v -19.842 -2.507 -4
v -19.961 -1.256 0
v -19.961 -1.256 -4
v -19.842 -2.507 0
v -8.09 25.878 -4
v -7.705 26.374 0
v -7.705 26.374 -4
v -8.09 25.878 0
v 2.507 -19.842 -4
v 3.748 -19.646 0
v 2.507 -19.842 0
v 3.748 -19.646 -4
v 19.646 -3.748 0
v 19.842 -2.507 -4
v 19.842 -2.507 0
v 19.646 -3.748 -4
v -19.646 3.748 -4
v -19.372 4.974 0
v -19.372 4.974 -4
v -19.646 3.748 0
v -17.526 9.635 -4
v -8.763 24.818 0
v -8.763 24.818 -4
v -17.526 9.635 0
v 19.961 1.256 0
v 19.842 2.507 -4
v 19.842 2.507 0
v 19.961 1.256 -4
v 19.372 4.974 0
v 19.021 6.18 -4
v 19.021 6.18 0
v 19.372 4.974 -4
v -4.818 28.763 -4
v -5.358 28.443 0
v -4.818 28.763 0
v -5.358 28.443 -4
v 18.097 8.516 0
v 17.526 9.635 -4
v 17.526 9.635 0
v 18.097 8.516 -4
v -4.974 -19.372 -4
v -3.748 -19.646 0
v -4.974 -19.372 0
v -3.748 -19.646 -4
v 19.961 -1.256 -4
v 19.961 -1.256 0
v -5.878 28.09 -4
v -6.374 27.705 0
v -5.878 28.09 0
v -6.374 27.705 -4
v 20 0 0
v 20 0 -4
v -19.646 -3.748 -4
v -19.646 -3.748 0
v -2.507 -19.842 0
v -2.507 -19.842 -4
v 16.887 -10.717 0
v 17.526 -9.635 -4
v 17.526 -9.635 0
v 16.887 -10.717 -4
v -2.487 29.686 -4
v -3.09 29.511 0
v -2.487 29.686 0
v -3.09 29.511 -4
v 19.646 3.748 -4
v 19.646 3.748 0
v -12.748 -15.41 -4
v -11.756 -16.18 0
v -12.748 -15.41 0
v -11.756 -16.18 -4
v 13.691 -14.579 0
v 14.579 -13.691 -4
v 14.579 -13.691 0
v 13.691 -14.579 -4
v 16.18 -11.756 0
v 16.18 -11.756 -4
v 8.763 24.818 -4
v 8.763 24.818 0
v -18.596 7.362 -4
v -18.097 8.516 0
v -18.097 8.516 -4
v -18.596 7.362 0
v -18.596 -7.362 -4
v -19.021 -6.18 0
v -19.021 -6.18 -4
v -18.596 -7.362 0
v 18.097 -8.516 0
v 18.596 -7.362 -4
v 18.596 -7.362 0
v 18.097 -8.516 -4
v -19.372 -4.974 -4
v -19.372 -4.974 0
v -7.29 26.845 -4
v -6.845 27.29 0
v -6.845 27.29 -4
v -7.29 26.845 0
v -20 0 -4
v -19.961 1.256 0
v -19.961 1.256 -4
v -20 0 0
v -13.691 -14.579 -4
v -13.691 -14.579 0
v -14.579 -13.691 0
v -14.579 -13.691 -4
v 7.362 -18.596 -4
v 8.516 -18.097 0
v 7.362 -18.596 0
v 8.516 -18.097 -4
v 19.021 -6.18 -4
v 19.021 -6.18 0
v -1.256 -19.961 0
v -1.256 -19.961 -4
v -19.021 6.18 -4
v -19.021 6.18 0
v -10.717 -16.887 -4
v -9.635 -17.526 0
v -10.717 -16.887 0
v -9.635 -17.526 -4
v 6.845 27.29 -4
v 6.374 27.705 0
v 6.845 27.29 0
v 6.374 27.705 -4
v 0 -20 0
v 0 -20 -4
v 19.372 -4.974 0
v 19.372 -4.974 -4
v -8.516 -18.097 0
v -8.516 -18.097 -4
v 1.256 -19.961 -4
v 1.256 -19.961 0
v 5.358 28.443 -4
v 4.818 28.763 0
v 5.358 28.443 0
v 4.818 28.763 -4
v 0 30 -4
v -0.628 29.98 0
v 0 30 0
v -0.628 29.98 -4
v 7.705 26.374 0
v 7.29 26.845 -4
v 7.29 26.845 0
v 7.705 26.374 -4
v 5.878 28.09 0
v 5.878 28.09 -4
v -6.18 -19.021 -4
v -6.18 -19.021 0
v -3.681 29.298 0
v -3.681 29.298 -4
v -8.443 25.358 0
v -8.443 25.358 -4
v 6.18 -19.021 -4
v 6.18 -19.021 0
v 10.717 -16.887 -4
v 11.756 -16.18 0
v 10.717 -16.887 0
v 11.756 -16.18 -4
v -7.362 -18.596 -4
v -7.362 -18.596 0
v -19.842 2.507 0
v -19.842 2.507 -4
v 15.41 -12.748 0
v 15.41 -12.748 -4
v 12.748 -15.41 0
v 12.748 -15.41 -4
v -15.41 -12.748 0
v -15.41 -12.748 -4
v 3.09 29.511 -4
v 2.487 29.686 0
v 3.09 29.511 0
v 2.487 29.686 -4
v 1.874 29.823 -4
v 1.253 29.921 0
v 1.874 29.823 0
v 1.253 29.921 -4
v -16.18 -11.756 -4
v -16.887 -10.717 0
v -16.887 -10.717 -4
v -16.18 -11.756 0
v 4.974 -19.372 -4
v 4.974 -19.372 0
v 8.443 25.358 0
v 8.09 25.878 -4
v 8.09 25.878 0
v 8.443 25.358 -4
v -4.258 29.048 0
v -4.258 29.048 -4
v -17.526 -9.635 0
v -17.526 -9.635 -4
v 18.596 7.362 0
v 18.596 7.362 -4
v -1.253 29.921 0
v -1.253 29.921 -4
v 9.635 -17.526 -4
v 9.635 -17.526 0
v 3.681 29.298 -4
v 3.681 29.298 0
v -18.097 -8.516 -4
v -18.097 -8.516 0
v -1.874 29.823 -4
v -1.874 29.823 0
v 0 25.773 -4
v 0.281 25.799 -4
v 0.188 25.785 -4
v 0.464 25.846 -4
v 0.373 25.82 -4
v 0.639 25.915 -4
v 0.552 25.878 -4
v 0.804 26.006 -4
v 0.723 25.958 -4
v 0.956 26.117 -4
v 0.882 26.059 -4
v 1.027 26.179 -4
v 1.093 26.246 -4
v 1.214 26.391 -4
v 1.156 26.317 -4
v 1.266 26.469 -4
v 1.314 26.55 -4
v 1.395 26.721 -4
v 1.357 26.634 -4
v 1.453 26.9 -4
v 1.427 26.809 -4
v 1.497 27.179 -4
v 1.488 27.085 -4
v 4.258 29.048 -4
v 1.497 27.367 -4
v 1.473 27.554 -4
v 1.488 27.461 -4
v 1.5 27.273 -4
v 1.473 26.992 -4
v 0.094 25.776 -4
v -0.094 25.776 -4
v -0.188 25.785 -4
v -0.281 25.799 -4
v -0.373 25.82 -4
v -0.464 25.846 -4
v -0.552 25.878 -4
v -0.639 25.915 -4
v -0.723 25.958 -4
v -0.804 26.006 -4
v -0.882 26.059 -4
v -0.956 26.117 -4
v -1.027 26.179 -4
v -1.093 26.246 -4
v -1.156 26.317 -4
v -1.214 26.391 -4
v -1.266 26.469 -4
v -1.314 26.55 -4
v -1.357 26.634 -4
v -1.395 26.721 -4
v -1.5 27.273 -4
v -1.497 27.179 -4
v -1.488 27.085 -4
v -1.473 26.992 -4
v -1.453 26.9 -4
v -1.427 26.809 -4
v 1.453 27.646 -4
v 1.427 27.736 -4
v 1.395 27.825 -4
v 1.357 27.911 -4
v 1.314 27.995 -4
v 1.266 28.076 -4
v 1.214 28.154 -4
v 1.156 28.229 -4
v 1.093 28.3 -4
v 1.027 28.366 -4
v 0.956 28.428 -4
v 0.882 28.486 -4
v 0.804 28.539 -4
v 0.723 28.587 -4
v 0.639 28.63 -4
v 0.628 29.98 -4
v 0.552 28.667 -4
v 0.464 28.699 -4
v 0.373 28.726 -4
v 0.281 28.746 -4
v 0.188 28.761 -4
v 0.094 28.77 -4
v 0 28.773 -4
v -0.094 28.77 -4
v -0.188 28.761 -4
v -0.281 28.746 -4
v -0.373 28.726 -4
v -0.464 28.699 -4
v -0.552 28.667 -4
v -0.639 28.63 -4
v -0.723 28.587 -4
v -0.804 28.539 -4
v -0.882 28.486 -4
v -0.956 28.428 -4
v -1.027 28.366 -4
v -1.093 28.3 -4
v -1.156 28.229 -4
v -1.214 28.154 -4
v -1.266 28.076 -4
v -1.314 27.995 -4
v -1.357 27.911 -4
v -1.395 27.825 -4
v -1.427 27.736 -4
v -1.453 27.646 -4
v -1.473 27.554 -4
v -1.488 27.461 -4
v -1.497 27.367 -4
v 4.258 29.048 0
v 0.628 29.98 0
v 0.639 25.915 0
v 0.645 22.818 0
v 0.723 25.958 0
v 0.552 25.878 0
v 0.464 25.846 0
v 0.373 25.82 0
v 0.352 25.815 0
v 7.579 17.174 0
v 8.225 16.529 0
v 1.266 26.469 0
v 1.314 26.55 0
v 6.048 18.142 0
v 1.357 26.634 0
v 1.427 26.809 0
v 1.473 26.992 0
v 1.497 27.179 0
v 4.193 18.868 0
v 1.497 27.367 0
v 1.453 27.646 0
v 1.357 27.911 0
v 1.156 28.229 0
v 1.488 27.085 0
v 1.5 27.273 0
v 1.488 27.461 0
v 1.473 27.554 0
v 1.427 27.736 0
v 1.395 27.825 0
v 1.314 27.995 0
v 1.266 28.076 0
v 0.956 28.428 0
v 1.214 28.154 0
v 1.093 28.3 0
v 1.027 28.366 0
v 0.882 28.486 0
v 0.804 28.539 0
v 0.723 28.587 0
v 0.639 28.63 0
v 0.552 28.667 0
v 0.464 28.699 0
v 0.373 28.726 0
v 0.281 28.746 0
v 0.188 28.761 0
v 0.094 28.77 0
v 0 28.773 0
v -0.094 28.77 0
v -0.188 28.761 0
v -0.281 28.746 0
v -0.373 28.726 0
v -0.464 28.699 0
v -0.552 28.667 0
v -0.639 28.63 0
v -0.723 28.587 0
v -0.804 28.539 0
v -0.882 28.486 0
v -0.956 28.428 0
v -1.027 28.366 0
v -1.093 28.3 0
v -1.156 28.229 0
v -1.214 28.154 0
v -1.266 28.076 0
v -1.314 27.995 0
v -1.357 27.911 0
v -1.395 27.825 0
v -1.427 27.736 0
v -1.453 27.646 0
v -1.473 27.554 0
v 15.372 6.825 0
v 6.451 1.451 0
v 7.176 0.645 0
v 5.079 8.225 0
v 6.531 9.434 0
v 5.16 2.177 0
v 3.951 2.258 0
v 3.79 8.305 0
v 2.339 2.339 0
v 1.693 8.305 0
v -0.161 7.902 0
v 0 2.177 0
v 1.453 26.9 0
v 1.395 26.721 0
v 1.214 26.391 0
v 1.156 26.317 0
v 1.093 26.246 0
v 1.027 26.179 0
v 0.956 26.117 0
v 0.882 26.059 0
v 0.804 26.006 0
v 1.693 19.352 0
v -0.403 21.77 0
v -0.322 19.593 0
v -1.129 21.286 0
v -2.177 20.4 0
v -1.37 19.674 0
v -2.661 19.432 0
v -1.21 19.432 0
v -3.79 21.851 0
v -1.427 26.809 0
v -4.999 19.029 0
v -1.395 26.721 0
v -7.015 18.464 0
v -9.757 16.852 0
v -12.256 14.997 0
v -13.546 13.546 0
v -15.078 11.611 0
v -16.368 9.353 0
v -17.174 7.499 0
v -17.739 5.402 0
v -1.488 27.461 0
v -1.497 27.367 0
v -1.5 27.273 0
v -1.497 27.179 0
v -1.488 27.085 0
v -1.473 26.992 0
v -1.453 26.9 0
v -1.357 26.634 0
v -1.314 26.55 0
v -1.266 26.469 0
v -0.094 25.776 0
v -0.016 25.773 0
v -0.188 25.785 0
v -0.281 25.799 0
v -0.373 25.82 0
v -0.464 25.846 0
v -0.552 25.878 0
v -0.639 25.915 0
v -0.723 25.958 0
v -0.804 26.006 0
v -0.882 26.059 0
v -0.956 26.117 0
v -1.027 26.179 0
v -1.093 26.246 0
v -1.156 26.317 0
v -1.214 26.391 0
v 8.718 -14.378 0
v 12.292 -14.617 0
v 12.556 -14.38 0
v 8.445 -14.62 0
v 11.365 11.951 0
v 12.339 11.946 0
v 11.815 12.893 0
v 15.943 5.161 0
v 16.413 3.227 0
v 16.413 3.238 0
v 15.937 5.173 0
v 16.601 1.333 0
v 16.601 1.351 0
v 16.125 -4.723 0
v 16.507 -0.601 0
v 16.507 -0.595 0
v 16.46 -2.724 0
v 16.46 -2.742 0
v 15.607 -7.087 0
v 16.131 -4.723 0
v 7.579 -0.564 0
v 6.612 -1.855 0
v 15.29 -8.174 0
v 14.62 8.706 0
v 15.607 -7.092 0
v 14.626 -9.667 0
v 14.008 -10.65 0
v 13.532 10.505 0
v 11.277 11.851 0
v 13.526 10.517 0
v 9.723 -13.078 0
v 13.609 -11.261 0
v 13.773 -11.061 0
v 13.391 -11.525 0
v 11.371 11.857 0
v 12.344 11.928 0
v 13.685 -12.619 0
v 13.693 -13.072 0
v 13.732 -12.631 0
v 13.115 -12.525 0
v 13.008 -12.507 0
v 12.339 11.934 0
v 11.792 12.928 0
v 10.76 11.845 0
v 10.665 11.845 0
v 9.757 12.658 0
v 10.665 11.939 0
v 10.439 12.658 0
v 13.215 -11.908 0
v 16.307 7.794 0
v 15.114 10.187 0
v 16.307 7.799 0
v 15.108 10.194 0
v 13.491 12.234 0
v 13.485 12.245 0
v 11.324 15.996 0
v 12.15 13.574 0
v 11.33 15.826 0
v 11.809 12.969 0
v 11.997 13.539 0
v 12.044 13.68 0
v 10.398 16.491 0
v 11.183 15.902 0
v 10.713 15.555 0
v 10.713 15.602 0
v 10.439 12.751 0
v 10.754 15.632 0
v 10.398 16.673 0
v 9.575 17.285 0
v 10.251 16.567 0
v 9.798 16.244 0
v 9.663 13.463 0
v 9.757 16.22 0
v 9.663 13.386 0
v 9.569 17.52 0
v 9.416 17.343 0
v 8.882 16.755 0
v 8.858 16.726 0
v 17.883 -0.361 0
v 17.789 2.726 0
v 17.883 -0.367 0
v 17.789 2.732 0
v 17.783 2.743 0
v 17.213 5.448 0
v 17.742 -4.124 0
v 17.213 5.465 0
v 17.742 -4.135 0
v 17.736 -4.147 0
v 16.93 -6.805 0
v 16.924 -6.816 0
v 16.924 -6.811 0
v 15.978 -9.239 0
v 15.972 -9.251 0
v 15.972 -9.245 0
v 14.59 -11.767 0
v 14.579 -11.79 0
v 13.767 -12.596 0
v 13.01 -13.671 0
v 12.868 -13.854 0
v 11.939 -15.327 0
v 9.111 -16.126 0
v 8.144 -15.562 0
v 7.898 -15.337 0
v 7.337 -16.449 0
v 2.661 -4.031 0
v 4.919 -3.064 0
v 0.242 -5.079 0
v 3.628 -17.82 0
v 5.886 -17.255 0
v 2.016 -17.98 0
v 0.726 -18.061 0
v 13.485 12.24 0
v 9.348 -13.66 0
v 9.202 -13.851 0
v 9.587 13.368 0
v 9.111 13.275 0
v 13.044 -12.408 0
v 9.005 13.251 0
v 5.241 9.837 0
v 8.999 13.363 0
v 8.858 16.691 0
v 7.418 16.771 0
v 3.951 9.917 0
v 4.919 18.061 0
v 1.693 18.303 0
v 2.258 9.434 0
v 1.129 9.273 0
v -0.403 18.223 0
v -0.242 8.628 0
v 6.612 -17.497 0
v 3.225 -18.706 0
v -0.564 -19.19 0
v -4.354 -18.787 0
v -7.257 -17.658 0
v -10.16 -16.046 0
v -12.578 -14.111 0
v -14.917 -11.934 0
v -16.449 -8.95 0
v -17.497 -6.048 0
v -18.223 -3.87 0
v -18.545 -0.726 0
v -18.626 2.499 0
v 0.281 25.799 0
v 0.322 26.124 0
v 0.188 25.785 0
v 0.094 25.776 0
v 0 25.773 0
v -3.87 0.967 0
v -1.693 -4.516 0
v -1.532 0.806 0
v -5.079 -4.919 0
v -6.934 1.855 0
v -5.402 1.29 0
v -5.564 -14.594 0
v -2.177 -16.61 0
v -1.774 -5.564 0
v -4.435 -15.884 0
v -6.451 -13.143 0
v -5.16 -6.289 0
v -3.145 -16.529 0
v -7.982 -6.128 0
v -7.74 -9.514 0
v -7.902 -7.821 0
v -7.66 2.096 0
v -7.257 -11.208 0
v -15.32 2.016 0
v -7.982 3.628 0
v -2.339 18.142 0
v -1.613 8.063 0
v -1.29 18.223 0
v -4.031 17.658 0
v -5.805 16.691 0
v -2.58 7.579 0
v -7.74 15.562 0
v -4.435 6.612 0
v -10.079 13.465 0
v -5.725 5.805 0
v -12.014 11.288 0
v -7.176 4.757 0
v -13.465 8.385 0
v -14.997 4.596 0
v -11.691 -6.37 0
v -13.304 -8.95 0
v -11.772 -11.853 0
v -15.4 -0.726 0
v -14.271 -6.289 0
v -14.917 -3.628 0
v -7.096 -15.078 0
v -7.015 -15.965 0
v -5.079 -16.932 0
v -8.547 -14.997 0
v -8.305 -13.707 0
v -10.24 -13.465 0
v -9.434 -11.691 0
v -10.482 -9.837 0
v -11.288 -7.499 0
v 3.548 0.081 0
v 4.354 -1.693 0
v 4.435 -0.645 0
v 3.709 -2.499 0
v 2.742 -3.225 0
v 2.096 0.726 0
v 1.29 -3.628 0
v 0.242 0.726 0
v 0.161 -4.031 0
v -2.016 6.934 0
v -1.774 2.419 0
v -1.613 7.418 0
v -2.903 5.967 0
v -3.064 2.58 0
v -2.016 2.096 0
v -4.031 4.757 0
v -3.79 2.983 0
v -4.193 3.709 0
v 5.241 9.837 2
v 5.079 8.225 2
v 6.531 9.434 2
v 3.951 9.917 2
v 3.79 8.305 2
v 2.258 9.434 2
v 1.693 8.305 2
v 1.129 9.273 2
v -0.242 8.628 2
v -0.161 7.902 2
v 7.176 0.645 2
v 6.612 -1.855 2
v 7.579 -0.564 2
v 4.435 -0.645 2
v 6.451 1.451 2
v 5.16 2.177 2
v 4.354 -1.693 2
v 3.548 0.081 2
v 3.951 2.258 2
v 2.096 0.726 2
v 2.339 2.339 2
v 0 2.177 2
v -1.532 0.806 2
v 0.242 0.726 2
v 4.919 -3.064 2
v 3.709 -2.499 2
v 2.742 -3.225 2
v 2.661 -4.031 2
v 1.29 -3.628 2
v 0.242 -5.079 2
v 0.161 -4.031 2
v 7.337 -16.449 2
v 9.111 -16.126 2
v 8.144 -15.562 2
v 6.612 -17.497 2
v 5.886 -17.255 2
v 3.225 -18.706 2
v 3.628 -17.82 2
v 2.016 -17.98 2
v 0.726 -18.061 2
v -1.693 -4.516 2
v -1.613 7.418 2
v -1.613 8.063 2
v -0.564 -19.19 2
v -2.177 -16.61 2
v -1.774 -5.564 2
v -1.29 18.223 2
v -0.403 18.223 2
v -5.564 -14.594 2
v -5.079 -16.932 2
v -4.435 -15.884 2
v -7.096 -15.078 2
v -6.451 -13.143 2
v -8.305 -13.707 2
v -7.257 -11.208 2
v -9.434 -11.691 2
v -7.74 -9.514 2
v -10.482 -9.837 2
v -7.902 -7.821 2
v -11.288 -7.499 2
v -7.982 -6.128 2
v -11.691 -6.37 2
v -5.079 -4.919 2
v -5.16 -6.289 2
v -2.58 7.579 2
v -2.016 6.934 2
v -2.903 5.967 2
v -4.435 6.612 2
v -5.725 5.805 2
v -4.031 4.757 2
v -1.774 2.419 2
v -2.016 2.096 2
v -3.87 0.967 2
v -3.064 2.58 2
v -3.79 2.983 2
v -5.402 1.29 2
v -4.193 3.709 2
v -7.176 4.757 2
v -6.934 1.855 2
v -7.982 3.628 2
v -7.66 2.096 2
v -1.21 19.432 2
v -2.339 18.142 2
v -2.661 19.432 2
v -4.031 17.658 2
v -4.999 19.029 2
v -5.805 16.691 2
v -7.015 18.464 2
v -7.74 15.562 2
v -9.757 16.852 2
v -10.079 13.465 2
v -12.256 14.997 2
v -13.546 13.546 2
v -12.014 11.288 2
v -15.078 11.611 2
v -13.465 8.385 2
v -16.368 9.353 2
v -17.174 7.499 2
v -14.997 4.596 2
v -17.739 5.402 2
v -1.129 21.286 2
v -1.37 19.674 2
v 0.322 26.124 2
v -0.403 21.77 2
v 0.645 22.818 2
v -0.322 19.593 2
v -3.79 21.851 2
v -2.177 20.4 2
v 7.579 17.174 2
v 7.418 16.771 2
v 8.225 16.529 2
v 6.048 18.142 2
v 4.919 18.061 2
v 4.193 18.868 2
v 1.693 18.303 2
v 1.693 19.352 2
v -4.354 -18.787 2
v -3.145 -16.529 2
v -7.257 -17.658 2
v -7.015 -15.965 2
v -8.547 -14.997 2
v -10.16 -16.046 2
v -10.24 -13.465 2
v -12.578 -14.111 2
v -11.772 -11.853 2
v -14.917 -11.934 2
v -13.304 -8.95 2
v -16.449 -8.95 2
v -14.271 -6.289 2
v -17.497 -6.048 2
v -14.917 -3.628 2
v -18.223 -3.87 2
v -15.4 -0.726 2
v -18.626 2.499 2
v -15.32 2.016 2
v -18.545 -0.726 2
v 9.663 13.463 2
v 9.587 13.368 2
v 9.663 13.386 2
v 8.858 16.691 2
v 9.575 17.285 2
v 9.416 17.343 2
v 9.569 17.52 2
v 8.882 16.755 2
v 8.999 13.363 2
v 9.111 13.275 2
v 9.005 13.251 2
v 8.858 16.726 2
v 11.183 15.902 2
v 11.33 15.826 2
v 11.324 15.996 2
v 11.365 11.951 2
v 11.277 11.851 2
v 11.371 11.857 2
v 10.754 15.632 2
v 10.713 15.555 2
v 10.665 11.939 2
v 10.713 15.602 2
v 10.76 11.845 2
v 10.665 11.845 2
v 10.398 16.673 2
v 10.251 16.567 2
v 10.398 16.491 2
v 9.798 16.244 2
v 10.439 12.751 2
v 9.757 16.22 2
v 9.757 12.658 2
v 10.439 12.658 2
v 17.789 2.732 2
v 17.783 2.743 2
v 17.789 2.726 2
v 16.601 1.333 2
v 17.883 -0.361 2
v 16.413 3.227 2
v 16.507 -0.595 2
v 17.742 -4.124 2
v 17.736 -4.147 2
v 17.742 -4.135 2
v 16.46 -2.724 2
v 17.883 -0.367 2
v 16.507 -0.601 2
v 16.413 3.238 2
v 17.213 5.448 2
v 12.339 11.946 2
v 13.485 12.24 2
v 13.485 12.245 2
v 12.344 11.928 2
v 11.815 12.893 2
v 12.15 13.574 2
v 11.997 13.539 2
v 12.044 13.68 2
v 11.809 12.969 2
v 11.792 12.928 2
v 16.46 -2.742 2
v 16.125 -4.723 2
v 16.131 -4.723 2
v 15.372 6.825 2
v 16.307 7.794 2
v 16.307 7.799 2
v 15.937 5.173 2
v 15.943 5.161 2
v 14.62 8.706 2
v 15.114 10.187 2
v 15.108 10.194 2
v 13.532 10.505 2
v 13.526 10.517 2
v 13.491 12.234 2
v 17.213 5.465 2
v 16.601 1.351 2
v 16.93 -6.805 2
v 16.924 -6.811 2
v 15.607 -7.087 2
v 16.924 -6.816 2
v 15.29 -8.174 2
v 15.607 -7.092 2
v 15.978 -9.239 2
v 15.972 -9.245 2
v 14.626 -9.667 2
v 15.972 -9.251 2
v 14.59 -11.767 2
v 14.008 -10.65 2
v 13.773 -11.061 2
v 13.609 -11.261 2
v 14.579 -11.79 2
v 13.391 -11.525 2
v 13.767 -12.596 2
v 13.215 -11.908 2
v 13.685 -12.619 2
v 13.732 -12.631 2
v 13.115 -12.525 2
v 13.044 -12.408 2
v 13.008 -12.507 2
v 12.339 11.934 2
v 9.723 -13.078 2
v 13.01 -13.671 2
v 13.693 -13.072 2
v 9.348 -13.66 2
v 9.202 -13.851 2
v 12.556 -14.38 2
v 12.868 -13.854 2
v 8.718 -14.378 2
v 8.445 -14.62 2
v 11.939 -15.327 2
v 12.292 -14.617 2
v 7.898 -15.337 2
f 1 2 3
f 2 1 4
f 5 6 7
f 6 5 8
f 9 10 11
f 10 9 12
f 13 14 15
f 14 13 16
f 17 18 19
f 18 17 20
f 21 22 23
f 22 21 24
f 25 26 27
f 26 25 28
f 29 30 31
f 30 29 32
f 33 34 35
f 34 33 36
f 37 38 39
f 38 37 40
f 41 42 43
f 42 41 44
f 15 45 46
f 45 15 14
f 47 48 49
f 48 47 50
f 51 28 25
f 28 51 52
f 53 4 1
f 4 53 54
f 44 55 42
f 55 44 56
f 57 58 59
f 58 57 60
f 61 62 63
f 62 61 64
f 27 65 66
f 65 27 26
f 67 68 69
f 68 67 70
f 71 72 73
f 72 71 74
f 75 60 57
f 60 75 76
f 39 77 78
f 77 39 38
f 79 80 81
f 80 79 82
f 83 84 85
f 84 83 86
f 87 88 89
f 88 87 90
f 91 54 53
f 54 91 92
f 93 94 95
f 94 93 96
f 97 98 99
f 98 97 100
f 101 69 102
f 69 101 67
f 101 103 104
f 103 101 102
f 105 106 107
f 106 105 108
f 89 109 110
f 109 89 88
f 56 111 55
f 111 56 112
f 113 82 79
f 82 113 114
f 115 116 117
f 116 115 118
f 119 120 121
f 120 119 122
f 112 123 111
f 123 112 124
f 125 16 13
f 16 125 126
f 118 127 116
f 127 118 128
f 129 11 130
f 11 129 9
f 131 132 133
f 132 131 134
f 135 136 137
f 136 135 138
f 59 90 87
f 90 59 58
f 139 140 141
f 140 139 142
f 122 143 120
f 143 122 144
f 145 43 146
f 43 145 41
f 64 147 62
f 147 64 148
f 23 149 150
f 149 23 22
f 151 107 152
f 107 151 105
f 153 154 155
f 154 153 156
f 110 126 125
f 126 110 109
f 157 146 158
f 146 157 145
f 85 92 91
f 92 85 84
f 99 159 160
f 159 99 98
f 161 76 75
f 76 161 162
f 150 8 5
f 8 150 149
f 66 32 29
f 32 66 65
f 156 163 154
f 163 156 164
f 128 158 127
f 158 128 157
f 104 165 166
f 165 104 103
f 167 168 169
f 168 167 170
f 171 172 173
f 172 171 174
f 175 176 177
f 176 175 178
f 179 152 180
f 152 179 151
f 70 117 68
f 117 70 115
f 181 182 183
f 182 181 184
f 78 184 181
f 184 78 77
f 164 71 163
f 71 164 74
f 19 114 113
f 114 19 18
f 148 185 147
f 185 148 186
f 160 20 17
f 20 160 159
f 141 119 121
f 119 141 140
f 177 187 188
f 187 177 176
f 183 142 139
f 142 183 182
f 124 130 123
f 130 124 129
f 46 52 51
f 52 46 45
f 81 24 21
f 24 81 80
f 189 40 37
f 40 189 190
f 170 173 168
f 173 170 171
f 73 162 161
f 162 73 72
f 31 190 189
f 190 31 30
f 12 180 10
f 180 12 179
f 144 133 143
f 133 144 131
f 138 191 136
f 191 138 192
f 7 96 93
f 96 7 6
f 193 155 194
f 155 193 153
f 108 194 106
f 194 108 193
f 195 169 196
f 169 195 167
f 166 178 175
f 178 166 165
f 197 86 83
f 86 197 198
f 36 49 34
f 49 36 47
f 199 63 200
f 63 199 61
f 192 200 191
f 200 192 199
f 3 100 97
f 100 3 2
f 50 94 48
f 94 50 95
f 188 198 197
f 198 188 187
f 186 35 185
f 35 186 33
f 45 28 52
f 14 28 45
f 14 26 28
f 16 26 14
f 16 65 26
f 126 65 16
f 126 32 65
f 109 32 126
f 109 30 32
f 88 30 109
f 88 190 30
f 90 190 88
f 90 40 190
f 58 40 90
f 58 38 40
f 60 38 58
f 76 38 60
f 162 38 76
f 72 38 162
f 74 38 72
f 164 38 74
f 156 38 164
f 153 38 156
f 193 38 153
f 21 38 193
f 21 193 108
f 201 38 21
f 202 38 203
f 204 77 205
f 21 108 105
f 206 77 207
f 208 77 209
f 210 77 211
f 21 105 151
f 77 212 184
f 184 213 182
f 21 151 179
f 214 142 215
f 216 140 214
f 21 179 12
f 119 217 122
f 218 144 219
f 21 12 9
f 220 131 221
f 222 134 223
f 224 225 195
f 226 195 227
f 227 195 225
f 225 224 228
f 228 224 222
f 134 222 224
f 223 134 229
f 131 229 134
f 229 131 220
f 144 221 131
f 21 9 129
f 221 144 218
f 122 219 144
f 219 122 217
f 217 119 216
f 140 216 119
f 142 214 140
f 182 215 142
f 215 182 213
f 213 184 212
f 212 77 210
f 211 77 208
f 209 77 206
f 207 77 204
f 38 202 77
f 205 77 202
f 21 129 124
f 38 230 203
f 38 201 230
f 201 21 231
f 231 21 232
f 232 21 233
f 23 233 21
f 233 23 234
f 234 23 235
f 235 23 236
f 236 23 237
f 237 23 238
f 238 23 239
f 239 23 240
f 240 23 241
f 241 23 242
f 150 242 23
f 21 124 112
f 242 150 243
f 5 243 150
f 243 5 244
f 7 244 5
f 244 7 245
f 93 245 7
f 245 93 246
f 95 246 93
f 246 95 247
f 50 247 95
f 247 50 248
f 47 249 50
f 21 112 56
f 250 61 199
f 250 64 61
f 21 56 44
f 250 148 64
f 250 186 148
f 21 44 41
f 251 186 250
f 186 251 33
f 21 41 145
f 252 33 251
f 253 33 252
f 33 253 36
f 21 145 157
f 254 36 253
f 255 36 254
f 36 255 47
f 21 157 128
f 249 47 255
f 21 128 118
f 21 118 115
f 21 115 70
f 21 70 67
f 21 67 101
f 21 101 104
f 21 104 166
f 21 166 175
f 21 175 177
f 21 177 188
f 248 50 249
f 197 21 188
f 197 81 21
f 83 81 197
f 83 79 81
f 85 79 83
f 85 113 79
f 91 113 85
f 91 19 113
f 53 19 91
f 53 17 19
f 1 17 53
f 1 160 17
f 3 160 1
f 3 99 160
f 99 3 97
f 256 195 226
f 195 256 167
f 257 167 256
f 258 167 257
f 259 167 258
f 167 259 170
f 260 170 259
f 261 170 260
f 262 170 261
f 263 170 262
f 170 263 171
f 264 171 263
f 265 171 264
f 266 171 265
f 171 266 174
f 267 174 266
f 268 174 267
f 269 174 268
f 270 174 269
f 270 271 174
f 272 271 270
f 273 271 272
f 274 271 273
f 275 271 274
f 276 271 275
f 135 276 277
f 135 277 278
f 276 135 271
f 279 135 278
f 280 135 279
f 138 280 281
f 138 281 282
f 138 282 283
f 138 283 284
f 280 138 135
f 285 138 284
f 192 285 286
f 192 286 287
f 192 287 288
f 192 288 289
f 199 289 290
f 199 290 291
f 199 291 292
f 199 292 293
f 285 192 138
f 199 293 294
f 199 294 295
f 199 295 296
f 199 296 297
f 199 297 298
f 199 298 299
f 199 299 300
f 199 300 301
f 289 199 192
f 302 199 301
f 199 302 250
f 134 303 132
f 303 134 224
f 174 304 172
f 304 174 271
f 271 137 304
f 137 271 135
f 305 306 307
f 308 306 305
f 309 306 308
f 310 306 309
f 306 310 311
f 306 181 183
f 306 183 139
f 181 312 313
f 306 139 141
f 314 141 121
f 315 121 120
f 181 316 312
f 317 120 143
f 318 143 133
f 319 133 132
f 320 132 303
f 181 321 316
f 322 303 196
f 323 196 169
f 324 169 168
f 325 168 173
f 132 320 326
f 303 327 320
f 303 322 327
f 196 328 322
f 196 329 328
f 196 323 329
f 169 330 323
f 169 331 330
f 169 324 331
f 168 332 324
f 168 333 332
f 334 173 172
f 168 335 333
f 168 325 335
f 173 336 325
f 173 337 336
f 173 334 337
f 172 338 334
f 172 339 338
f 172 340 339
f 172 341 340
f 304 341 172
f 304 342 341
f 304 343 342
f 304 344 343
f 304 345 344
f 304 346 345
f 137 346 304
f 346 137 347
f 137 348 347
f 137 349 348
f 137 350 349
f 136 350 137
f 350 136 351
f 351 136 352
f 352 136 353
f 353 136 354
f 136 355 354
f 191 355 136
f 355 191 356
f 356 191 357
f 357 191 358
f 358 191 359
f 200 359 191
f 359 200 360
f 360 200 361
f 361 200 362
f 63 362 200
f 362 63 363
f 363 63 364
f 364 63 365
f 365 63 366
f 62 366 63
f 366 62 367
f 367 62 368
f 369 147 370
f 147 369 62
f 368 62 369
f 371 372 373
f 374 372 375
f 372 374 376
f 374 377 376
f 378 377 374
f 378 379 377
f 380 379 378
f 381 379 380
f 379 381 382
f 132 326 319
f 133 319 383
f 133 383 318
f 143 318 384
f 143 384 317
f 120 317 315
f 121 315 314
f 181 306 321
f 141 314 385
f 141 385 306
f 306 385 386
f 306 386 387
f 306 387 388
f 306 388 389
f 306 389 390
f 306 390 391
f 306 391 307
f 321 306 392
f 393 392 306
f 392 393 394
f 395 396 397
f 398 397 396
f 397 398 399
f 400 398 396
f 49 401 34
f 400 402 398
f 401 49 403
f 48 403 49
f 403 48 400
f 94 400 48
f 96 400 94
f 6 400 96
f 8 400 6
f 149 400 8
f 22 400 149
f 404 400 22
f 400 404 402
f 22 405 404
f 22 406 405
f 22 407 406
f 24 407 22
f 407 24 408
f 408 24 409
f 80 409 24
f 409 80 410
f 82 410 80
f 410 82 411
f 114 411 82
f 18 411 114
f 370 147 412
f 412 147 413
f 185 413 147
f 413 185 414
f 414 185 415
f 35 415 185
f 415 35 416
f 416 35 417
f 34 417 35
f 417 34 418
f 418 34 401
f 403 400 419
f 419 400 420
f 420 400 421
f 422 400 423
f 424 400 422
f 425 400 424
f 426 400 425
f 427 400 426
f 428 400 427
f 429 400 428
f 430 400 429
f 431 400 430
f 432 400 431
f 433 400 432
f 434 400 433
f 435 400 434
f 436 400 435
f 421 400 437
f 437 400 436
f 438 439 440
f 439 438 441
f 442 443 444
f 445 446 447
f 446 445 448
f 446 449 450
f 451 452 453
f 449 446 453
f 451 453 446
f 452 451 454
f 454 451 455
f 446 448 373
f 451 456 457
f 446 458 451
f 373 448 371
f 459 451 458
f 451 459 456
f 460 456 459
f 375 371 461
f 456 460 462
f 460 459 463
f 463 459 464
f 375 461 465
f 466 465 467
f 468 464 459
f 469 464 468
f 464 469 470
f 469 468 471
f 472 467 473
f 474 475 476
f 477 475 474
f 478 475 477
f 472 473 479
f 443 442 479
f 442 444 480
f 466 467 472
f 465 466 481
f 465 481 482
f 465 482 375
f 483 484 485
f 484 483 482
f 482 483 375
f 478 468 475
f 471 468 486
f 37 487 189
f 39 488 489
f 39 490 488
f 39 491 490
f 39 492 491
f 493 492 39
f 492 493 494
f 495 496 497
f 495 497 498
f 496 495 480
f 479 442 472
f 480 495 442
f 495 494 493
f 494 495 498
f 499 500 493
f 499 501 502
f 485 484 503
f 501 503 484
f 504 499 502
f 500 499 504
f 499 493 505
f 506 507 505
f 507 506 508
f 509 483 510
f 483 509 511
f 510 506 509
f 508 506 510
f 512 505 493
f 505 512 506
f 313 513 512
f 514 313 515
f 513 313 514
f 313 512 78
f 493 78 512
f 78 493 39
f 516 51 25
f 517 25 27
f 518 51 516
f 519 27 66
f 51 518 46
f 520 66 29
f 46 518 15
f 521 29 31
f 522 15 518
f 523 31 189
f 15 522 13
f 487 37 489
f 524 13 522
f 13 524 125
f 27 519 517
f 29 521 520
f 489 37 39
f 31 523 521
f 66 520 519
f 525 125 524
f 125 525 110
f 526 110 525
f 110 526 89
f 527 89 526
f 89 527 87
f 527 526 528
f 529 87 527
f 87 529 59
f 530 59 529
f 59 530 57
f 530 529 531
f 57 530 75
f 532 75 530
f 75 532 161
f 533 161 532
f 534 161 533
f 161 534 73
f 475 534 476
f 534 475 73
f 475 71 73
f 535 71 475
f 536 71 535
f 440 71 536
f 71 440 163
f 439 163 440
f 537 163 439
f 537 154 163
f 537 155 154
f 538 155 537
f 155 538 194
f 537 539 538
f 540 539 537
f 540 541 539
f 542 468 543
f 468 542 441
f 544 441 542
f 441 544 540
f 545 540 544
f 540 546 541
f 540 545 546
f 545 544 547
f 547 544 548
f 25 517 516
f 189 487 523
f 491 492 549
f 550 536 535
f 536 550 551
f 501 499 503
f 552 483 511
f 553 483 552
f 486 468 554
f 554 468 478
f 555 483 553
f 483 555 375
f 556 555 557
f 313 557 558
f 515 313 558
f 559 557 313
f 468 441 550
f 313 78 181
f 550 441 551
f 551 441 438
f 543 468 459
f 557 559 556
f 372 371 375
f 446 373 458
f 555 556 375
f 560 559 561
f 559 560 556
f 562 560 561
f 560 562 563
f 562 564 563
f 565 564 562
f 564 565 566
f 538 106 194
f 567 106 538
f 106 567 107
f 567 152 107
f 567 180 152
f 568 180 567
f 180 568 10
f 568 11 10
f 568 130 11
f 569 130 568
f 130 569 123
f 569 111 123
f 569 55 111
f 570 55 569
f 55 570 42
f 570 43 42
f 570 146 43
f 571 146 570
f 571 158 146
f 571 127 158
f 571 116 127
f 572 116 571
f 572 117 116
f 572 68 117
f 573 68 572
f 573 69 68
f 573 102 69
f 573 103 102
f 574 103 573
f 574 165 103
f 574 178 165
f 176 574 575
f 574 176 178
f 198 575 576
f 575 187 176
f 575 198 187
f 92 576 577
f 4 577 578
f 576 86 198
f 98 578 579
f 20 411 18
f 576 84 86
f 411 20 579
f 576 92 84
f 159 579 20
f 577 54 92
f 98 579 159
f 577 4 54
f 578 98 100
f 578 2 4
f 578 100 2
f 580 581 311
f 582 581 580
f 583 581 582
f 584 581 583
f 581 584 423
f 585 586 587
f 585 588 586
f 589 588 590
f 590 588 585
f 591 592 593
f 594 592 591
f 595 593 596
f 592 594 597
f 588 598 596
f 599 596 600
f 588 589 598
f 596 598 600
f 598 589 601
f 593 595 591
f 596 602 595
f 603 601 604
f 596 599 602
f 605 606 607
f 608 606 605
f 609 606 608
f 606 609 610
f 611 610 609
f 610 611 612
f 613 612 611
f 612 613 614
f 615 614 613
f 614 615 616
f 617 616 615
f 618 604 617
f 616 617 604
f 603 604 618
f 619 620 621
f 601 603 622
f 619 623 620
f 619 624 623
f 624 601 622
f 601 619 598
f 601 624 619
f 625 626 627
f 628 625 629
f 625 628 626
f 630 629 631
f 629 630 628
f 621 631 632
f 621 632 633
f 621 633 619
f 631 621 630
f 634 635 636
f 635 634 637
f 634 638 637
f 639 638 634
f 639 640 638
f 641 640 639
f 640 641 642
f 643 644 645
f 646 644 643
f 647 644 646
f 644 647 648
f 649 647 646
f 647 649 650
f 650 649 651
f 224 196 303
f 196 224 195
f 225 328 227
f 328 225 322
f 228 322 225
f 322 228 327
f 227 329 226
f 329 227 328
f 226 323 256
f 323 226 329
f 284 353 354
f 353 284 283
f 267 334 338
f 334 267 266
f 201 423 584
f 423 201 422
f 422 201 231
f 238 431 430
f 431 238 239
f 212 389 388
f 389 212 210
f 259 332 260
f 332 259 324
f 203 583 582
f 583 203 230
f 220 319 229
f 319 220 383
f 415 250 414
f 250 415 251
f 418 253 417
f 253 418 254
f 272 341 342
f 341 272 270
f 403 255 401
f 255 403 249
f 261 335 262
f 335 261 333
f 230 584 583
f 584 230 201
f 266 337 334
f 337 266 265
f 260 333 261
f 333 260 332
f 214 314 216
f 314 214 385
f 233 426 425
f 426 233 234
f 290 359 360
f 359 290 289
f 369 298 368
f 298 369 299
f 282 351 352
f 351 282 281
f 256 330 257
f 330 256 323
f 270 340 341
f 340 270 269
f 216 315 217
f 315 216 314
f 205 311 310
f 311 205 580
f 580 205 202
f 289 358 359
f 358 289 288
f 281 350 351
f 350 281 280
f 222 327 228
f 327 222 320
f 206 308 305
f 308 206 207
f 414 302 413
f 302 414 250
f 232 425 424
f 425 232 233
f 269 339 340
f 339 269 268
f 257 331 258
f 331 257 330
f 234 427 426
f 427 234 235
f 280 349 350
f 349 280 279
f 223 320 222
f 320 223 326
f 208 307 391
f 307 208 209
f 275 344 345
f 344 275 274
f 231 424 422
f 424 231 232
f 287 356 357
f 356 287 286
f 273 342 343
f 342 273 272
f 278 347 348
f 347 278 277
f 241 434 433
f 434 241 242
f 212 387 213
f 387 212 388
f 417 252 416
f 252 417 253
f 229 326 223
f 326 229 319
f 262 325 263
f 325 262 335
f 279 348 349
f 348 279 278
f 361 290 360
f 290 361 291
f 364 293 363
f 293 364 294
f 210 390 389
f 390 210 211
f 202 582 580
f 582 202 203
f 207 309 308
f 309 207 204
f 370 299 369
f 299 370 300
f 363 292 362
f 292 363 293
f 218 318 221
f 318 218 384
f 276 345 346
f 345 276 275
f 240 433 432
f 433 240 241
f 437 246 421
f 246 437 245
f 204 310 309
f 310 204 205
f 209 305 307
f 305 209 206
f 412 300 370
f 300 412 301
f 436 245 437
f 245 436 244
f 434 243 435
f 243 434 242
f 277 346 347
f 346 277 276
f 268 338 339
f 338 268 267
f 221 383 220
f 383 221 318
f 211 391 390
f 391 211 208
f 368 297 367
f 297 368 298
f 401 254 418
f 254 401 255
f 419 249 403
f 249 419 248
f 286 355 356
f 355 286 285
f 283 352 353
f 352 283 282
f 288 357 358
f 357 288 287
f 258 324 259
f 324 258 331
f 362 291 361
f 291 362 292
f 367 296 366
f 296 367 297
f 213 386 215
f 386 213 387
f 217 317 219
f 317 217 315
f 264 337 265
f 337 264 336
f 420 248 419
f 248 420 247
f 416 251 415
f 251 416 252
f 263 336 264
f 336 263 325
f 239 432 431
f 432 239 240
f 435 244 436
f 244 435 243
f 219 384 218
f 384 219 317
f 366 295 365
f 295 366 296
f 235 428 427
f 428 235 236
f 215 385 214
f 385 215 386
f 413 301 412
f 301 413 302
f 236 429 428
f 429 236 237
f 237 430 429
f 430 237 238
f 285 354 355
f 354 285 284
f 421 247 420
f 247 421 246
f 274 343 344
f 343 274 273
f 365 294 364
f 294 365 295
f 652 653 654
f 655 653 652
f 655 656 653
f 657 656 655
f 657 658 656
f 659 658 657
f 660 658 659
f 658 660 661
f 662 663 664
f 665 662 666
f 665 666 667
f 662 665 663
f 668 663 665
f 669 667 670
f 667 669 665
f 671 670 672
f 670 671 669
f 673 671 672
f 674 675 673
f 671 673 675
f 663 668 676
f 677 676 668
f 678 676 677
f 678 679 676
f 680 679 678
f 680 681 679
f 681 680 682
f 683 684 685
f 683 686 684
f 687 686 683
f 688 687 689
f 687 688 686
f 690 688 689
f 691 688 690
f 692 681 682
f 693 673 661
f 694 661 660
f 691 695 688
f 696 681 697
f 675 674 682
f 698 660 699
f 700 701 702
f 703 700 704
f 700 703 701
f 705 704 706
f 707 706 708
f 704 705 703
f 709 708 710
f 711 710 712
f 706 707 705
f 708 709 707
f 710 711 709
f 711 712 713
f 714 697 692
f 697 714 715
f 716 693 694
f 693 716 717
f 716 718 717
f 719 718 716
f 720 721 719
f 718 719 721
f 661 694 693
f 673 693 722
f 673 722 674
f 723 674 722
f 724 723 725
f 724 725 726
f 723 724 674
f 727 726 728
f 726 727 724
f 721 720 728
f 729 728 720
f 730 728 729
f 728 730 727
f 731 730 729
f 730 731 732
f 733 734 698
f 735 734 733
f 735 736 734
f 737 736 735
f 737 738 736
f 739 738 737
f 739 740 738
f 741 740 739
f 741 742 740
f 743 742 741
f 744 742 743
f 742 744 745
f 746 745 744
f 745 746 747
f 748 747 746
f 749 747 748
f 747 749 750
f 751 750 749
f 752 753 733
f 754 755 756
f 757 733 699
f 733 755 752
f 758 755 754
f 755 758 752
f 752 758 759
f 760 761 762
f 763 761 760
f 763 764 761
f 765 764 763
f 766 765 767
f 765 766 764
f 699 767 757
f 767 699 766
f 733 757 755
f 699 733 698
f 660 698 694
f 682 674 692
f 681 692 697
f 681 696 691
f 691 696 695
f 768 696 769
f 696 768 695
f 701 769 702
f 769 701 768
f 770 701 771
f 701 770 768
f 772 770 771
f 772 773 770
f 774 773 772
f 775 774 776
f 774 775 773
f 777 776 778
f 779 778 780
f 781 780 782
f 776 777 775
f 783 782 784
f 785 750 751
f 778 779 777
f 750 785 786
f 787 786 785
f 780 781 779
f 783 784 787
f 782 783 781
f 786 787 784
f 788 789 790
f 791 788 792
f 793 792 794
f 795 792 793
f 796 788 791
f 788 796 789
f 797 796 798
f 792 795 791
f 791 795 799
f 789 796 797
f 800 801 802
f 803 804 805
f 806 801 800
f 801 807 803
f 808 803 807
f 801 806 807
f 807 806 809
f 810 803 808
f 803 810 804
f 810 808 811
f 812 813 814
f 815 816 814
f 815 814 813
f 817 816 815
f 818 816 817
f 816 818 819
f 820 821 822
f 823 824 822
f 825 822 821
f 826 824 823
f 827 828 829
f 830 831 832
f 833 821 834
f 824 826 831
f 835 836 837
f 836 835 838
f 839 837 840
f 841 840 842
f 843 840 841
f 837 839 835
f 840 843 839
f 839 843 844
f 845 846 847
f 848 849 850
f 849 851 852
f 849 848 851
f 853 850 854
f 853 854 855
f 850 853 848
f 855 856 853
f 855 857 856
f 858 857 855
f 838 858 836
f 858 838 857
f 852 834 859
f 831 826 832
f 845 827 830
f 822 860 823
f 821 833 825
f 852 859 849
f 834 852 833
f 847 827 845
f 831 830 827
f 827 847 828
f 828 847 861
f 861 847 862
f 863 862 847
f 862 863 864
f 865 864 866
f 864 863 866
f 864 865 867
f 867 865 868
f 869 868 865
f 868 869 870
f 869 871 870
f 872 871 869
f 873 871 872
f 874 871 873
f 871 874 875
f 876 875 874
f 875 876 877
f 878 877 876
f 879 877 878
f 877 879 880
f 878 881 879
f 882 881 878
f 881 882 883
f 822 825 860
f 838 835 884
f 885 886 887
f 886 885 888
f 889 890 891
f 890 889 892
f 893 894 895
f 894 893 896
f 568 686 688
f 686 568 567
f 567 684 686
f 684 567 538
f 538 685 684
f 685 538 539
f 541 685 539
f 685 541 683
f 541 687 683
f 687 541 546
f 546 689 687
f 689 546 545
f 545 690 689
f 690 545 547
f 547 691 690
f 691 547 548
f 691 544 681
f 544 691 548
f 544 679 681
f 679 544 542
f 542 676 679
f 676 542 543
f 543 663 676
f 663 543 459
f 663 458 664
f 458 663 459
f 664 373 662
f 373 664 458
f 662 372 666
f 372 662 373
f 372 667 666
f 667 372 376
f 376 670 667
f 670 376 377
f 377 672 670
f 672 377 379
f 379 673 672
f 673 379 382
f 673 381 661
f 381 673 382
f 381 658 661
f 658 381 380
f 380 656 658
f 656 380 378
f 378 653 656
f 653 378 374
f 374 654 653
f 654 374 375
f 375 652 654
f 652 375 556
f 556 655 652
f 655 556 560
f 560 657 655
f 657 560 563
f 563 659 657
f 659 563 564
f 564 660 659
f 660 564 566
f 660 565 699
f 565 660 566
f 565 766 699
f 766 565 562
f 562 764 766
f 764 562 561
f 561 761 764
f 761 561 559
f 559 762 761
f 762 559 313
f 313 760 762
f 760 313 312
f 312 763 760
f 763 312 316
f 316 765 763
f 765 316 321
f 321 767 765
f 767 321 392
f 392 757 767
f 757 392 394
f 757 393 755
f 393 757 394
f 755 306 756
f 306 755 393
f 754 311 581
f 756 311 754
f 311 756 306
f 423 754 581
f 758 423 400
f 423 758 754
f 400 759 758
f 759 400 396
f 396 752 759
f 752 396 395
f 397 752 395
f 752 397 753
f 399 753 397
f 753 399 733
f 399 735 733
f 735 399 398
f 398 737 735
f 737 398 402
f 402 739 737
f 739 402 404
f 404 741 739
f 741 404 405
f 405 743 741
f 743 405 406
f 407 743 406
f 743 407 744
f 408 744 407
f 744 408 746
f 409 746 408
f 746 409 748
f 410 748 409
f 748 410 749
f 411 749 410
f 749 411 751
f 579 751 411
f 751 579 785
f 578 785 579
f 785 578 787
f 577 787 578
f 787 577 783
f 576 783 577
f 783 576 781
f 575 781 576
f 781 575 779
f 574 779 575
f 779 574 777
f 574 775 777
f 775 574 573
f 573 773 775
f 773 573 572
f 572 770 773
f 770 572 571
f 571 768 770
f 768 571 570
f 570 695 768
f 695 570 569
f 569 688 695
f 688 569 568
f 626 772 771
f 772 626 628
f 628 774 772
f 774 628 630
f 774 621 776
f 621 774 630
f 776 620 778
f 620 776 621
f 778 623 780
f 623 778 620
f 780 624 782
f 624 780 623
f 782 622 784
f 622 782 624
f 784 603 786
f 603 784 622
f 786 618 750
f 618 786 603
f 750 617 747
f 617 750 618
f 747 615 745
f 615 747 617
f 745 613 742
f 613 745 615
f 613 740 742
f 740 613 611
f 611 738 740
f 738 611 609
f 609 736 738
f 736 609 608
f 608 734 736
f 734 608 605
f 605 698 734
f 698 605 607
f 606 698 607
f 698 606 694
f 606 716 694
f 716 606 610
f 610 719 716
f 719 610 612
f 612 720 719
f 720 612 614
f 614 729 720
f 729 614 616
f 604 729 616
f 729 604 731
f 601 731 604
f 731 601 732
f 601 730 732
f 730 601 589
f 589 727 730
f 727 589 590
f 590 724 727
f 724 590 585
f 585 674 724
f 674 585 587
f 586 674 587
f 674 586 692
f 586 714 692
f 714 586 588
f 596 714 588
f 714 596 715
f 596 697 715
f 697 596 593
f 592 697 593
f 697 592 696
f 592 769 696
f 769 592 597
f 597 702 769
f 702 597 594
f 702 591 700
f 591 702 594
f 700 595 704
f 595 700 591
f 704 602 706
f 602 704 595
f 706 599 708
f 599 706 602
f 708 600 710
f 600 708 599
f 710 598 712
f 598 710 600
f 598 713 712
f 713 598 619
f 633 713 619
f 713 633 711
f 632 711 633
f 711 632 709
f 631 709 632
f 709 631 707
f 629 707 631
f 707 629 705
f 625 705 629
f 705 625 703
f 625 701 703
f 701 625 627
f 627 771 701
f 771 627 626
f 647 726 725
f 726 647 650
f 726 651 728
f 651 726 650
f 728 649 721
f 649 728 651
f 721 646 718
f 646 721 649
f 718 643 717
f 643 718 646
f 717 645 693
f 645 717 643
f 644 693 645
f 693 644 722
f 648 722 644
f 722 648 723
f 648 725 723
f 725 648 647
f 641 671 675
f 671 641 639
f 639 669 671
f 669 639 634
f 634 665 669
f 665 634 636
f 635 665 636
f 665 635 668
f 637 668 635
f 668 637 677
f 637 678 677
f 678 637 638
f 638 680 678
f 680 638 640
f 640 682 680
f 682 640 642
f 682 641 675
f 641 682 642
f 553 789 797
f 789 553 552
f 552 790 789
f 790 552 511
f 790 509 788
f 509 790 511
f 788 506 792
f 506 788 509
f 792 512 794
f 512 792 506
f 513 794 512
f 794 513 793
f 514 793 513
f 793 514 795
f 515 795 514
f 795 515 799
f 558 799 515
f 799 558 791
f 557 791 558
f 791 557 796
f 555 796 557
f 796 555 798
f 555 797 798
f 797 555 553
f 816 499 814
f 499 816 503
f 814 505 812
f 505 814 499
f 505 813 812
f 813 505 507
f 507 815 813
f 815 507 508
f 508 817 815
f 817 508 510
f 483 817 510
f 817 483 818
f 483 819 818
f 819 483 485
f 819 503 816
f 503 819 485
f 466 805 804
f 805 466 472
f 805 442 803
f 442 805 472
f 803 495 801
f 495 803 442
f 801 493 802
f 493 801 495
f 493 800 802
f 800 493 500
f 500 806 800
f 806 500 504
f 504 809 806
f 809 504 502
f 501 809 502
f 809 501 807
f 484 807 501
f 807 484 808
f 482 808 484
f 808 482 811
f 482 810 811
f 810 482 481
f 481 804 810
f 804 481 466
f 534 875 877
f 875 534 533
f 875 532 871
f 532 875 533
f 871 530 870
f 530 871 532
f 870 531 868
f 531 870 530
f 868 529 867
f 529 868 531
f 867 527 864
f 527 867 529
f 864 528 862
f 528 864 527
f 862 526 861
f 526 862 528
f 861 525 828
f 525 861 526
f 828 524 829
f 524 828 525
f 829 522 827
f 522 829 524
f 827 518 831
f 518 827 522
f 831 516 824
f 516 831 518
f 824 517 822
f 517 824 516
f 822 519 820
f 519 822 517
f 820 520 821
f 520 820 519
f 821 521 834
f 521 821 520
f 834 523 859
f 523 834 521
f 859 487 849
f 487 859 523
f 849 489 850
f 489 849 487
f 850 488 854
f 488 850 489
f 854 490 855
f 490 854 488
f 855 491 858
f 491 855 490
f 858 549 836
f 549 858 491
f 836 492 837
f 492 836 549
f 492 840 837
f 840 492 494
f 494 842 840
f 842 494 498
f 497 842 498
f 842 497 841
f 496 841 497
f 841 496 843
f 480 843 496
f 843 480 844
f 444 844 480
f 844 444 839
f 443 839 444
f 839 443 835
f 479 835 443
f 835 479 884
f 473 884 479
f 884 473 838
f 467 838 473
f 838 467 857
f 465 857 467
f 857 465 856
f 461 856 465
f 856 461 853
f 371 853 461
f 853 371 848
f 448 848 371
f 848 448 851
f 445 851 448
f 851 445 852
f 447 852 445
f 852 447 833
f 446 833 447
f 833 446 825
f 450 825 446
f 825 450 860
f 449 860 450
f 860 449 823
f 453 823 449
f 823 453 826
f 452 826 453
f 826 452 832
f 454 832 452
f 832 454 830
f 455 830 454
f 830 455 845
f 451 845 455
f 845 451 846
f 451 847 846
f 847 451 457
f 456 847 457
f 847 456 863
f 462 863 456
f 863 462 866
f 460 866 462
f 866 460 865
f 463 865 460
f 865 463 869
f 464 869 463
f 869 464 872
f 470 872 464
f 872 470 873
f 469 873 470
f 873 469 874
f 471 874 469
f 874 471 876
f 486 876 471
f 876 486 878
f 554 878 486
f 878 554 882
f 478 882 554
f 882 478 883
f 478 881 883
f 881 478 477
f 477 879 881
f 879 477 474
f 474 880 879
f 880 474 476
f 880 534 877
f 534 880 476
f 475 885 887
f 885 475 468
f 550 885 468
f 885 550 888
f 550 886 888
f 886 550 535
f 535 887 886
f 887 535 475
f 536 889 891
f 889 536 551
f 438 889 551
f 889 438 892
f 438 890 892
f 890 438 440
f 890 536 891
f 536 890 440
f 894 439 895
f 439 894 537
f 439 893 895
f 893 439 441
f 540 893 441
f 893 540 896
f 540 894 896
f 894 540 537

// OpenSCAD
//Gumcam(15,3);


module CSJ(radius,depth)
{
	translate([8,5,0])
	scale([radius/20,radius/20,1])
	//rotate(a = [0,90,0])
	linear_extrude(height = depth)
	import("CSJ.dxf");
}

//-- Cilindro normal. r es el radio, h es la altura
module redondo(){
rad = 20;
difference() {

	cylinder (r = rad, h = 3, $fn = 100);
	translate([0,rad -4, -10])
	cylinder (r = 1.5, h = 20, $fn = 100);
}
}
module cuad_red(lx,ly,r,h){
//-- Parametros de la caja
/*lx = 40; //-- Longitud en eje x
ly = 40; //-- Longitud en eje y
r = 5; //-- Radio del redondeo de las esquinas
h = 3; //-- Altura*/
h=h/2;
//-- Coordenadas del cilindro del primer cuadrante
cx = lx/2 - r;
cy = ly/2 - r;

//-- Posicion de los 4 cilindros de las esquinas
P1 = [cx, cy, 0];
P2 = [-cx, cy, 0];
P3 = [-cx, -cy, 0];
P4 = [cx, -cy, 0];
 

//-- Obtener el menor objeto convexo que contiene
//-- los 4 cilindros
hull() {
  translate(P1)
    cylinder(r = r, h = h, center = true, $fn = 20);
   
  translate(P2)
    cylinder(r = r, h = h, center = true, $fn = 20);
   
  translate(P3)
    cylinder(r = r, h = h, center = true, $fn = 20);
   
  translate(P4)
    cylinder(r = r, h = h, center = true, $fn = 20);
}


}
module base(dim,h){
/*difference() {
cuad_red(dim,dim,4,h);
	translate([-dim/2+3,dim/2-3, -10])
	cylinder (r = 1.5, h = 20, $fn = 100);
}*/
	difference() {
		hull() {
			translate([0,0, -4])cylinder (r = dim/2, h = 4, $fn = 100);
			translate([0,dim/2, -4]) cylinder (r = dim/4, h = 4, $fn = 100);
		}
		translate([0,dim/2+dim/5.5, -10]) 	cylinder (r = 1.5, h = 20, $fn = 100);
	}
}


module llavero(dim,h){
union(){
	color ("red")base(dim,h);
	translate([-8,-5, ])
	CSJ(dim/3,h/3*2);
}

}

llavero(40,3);
